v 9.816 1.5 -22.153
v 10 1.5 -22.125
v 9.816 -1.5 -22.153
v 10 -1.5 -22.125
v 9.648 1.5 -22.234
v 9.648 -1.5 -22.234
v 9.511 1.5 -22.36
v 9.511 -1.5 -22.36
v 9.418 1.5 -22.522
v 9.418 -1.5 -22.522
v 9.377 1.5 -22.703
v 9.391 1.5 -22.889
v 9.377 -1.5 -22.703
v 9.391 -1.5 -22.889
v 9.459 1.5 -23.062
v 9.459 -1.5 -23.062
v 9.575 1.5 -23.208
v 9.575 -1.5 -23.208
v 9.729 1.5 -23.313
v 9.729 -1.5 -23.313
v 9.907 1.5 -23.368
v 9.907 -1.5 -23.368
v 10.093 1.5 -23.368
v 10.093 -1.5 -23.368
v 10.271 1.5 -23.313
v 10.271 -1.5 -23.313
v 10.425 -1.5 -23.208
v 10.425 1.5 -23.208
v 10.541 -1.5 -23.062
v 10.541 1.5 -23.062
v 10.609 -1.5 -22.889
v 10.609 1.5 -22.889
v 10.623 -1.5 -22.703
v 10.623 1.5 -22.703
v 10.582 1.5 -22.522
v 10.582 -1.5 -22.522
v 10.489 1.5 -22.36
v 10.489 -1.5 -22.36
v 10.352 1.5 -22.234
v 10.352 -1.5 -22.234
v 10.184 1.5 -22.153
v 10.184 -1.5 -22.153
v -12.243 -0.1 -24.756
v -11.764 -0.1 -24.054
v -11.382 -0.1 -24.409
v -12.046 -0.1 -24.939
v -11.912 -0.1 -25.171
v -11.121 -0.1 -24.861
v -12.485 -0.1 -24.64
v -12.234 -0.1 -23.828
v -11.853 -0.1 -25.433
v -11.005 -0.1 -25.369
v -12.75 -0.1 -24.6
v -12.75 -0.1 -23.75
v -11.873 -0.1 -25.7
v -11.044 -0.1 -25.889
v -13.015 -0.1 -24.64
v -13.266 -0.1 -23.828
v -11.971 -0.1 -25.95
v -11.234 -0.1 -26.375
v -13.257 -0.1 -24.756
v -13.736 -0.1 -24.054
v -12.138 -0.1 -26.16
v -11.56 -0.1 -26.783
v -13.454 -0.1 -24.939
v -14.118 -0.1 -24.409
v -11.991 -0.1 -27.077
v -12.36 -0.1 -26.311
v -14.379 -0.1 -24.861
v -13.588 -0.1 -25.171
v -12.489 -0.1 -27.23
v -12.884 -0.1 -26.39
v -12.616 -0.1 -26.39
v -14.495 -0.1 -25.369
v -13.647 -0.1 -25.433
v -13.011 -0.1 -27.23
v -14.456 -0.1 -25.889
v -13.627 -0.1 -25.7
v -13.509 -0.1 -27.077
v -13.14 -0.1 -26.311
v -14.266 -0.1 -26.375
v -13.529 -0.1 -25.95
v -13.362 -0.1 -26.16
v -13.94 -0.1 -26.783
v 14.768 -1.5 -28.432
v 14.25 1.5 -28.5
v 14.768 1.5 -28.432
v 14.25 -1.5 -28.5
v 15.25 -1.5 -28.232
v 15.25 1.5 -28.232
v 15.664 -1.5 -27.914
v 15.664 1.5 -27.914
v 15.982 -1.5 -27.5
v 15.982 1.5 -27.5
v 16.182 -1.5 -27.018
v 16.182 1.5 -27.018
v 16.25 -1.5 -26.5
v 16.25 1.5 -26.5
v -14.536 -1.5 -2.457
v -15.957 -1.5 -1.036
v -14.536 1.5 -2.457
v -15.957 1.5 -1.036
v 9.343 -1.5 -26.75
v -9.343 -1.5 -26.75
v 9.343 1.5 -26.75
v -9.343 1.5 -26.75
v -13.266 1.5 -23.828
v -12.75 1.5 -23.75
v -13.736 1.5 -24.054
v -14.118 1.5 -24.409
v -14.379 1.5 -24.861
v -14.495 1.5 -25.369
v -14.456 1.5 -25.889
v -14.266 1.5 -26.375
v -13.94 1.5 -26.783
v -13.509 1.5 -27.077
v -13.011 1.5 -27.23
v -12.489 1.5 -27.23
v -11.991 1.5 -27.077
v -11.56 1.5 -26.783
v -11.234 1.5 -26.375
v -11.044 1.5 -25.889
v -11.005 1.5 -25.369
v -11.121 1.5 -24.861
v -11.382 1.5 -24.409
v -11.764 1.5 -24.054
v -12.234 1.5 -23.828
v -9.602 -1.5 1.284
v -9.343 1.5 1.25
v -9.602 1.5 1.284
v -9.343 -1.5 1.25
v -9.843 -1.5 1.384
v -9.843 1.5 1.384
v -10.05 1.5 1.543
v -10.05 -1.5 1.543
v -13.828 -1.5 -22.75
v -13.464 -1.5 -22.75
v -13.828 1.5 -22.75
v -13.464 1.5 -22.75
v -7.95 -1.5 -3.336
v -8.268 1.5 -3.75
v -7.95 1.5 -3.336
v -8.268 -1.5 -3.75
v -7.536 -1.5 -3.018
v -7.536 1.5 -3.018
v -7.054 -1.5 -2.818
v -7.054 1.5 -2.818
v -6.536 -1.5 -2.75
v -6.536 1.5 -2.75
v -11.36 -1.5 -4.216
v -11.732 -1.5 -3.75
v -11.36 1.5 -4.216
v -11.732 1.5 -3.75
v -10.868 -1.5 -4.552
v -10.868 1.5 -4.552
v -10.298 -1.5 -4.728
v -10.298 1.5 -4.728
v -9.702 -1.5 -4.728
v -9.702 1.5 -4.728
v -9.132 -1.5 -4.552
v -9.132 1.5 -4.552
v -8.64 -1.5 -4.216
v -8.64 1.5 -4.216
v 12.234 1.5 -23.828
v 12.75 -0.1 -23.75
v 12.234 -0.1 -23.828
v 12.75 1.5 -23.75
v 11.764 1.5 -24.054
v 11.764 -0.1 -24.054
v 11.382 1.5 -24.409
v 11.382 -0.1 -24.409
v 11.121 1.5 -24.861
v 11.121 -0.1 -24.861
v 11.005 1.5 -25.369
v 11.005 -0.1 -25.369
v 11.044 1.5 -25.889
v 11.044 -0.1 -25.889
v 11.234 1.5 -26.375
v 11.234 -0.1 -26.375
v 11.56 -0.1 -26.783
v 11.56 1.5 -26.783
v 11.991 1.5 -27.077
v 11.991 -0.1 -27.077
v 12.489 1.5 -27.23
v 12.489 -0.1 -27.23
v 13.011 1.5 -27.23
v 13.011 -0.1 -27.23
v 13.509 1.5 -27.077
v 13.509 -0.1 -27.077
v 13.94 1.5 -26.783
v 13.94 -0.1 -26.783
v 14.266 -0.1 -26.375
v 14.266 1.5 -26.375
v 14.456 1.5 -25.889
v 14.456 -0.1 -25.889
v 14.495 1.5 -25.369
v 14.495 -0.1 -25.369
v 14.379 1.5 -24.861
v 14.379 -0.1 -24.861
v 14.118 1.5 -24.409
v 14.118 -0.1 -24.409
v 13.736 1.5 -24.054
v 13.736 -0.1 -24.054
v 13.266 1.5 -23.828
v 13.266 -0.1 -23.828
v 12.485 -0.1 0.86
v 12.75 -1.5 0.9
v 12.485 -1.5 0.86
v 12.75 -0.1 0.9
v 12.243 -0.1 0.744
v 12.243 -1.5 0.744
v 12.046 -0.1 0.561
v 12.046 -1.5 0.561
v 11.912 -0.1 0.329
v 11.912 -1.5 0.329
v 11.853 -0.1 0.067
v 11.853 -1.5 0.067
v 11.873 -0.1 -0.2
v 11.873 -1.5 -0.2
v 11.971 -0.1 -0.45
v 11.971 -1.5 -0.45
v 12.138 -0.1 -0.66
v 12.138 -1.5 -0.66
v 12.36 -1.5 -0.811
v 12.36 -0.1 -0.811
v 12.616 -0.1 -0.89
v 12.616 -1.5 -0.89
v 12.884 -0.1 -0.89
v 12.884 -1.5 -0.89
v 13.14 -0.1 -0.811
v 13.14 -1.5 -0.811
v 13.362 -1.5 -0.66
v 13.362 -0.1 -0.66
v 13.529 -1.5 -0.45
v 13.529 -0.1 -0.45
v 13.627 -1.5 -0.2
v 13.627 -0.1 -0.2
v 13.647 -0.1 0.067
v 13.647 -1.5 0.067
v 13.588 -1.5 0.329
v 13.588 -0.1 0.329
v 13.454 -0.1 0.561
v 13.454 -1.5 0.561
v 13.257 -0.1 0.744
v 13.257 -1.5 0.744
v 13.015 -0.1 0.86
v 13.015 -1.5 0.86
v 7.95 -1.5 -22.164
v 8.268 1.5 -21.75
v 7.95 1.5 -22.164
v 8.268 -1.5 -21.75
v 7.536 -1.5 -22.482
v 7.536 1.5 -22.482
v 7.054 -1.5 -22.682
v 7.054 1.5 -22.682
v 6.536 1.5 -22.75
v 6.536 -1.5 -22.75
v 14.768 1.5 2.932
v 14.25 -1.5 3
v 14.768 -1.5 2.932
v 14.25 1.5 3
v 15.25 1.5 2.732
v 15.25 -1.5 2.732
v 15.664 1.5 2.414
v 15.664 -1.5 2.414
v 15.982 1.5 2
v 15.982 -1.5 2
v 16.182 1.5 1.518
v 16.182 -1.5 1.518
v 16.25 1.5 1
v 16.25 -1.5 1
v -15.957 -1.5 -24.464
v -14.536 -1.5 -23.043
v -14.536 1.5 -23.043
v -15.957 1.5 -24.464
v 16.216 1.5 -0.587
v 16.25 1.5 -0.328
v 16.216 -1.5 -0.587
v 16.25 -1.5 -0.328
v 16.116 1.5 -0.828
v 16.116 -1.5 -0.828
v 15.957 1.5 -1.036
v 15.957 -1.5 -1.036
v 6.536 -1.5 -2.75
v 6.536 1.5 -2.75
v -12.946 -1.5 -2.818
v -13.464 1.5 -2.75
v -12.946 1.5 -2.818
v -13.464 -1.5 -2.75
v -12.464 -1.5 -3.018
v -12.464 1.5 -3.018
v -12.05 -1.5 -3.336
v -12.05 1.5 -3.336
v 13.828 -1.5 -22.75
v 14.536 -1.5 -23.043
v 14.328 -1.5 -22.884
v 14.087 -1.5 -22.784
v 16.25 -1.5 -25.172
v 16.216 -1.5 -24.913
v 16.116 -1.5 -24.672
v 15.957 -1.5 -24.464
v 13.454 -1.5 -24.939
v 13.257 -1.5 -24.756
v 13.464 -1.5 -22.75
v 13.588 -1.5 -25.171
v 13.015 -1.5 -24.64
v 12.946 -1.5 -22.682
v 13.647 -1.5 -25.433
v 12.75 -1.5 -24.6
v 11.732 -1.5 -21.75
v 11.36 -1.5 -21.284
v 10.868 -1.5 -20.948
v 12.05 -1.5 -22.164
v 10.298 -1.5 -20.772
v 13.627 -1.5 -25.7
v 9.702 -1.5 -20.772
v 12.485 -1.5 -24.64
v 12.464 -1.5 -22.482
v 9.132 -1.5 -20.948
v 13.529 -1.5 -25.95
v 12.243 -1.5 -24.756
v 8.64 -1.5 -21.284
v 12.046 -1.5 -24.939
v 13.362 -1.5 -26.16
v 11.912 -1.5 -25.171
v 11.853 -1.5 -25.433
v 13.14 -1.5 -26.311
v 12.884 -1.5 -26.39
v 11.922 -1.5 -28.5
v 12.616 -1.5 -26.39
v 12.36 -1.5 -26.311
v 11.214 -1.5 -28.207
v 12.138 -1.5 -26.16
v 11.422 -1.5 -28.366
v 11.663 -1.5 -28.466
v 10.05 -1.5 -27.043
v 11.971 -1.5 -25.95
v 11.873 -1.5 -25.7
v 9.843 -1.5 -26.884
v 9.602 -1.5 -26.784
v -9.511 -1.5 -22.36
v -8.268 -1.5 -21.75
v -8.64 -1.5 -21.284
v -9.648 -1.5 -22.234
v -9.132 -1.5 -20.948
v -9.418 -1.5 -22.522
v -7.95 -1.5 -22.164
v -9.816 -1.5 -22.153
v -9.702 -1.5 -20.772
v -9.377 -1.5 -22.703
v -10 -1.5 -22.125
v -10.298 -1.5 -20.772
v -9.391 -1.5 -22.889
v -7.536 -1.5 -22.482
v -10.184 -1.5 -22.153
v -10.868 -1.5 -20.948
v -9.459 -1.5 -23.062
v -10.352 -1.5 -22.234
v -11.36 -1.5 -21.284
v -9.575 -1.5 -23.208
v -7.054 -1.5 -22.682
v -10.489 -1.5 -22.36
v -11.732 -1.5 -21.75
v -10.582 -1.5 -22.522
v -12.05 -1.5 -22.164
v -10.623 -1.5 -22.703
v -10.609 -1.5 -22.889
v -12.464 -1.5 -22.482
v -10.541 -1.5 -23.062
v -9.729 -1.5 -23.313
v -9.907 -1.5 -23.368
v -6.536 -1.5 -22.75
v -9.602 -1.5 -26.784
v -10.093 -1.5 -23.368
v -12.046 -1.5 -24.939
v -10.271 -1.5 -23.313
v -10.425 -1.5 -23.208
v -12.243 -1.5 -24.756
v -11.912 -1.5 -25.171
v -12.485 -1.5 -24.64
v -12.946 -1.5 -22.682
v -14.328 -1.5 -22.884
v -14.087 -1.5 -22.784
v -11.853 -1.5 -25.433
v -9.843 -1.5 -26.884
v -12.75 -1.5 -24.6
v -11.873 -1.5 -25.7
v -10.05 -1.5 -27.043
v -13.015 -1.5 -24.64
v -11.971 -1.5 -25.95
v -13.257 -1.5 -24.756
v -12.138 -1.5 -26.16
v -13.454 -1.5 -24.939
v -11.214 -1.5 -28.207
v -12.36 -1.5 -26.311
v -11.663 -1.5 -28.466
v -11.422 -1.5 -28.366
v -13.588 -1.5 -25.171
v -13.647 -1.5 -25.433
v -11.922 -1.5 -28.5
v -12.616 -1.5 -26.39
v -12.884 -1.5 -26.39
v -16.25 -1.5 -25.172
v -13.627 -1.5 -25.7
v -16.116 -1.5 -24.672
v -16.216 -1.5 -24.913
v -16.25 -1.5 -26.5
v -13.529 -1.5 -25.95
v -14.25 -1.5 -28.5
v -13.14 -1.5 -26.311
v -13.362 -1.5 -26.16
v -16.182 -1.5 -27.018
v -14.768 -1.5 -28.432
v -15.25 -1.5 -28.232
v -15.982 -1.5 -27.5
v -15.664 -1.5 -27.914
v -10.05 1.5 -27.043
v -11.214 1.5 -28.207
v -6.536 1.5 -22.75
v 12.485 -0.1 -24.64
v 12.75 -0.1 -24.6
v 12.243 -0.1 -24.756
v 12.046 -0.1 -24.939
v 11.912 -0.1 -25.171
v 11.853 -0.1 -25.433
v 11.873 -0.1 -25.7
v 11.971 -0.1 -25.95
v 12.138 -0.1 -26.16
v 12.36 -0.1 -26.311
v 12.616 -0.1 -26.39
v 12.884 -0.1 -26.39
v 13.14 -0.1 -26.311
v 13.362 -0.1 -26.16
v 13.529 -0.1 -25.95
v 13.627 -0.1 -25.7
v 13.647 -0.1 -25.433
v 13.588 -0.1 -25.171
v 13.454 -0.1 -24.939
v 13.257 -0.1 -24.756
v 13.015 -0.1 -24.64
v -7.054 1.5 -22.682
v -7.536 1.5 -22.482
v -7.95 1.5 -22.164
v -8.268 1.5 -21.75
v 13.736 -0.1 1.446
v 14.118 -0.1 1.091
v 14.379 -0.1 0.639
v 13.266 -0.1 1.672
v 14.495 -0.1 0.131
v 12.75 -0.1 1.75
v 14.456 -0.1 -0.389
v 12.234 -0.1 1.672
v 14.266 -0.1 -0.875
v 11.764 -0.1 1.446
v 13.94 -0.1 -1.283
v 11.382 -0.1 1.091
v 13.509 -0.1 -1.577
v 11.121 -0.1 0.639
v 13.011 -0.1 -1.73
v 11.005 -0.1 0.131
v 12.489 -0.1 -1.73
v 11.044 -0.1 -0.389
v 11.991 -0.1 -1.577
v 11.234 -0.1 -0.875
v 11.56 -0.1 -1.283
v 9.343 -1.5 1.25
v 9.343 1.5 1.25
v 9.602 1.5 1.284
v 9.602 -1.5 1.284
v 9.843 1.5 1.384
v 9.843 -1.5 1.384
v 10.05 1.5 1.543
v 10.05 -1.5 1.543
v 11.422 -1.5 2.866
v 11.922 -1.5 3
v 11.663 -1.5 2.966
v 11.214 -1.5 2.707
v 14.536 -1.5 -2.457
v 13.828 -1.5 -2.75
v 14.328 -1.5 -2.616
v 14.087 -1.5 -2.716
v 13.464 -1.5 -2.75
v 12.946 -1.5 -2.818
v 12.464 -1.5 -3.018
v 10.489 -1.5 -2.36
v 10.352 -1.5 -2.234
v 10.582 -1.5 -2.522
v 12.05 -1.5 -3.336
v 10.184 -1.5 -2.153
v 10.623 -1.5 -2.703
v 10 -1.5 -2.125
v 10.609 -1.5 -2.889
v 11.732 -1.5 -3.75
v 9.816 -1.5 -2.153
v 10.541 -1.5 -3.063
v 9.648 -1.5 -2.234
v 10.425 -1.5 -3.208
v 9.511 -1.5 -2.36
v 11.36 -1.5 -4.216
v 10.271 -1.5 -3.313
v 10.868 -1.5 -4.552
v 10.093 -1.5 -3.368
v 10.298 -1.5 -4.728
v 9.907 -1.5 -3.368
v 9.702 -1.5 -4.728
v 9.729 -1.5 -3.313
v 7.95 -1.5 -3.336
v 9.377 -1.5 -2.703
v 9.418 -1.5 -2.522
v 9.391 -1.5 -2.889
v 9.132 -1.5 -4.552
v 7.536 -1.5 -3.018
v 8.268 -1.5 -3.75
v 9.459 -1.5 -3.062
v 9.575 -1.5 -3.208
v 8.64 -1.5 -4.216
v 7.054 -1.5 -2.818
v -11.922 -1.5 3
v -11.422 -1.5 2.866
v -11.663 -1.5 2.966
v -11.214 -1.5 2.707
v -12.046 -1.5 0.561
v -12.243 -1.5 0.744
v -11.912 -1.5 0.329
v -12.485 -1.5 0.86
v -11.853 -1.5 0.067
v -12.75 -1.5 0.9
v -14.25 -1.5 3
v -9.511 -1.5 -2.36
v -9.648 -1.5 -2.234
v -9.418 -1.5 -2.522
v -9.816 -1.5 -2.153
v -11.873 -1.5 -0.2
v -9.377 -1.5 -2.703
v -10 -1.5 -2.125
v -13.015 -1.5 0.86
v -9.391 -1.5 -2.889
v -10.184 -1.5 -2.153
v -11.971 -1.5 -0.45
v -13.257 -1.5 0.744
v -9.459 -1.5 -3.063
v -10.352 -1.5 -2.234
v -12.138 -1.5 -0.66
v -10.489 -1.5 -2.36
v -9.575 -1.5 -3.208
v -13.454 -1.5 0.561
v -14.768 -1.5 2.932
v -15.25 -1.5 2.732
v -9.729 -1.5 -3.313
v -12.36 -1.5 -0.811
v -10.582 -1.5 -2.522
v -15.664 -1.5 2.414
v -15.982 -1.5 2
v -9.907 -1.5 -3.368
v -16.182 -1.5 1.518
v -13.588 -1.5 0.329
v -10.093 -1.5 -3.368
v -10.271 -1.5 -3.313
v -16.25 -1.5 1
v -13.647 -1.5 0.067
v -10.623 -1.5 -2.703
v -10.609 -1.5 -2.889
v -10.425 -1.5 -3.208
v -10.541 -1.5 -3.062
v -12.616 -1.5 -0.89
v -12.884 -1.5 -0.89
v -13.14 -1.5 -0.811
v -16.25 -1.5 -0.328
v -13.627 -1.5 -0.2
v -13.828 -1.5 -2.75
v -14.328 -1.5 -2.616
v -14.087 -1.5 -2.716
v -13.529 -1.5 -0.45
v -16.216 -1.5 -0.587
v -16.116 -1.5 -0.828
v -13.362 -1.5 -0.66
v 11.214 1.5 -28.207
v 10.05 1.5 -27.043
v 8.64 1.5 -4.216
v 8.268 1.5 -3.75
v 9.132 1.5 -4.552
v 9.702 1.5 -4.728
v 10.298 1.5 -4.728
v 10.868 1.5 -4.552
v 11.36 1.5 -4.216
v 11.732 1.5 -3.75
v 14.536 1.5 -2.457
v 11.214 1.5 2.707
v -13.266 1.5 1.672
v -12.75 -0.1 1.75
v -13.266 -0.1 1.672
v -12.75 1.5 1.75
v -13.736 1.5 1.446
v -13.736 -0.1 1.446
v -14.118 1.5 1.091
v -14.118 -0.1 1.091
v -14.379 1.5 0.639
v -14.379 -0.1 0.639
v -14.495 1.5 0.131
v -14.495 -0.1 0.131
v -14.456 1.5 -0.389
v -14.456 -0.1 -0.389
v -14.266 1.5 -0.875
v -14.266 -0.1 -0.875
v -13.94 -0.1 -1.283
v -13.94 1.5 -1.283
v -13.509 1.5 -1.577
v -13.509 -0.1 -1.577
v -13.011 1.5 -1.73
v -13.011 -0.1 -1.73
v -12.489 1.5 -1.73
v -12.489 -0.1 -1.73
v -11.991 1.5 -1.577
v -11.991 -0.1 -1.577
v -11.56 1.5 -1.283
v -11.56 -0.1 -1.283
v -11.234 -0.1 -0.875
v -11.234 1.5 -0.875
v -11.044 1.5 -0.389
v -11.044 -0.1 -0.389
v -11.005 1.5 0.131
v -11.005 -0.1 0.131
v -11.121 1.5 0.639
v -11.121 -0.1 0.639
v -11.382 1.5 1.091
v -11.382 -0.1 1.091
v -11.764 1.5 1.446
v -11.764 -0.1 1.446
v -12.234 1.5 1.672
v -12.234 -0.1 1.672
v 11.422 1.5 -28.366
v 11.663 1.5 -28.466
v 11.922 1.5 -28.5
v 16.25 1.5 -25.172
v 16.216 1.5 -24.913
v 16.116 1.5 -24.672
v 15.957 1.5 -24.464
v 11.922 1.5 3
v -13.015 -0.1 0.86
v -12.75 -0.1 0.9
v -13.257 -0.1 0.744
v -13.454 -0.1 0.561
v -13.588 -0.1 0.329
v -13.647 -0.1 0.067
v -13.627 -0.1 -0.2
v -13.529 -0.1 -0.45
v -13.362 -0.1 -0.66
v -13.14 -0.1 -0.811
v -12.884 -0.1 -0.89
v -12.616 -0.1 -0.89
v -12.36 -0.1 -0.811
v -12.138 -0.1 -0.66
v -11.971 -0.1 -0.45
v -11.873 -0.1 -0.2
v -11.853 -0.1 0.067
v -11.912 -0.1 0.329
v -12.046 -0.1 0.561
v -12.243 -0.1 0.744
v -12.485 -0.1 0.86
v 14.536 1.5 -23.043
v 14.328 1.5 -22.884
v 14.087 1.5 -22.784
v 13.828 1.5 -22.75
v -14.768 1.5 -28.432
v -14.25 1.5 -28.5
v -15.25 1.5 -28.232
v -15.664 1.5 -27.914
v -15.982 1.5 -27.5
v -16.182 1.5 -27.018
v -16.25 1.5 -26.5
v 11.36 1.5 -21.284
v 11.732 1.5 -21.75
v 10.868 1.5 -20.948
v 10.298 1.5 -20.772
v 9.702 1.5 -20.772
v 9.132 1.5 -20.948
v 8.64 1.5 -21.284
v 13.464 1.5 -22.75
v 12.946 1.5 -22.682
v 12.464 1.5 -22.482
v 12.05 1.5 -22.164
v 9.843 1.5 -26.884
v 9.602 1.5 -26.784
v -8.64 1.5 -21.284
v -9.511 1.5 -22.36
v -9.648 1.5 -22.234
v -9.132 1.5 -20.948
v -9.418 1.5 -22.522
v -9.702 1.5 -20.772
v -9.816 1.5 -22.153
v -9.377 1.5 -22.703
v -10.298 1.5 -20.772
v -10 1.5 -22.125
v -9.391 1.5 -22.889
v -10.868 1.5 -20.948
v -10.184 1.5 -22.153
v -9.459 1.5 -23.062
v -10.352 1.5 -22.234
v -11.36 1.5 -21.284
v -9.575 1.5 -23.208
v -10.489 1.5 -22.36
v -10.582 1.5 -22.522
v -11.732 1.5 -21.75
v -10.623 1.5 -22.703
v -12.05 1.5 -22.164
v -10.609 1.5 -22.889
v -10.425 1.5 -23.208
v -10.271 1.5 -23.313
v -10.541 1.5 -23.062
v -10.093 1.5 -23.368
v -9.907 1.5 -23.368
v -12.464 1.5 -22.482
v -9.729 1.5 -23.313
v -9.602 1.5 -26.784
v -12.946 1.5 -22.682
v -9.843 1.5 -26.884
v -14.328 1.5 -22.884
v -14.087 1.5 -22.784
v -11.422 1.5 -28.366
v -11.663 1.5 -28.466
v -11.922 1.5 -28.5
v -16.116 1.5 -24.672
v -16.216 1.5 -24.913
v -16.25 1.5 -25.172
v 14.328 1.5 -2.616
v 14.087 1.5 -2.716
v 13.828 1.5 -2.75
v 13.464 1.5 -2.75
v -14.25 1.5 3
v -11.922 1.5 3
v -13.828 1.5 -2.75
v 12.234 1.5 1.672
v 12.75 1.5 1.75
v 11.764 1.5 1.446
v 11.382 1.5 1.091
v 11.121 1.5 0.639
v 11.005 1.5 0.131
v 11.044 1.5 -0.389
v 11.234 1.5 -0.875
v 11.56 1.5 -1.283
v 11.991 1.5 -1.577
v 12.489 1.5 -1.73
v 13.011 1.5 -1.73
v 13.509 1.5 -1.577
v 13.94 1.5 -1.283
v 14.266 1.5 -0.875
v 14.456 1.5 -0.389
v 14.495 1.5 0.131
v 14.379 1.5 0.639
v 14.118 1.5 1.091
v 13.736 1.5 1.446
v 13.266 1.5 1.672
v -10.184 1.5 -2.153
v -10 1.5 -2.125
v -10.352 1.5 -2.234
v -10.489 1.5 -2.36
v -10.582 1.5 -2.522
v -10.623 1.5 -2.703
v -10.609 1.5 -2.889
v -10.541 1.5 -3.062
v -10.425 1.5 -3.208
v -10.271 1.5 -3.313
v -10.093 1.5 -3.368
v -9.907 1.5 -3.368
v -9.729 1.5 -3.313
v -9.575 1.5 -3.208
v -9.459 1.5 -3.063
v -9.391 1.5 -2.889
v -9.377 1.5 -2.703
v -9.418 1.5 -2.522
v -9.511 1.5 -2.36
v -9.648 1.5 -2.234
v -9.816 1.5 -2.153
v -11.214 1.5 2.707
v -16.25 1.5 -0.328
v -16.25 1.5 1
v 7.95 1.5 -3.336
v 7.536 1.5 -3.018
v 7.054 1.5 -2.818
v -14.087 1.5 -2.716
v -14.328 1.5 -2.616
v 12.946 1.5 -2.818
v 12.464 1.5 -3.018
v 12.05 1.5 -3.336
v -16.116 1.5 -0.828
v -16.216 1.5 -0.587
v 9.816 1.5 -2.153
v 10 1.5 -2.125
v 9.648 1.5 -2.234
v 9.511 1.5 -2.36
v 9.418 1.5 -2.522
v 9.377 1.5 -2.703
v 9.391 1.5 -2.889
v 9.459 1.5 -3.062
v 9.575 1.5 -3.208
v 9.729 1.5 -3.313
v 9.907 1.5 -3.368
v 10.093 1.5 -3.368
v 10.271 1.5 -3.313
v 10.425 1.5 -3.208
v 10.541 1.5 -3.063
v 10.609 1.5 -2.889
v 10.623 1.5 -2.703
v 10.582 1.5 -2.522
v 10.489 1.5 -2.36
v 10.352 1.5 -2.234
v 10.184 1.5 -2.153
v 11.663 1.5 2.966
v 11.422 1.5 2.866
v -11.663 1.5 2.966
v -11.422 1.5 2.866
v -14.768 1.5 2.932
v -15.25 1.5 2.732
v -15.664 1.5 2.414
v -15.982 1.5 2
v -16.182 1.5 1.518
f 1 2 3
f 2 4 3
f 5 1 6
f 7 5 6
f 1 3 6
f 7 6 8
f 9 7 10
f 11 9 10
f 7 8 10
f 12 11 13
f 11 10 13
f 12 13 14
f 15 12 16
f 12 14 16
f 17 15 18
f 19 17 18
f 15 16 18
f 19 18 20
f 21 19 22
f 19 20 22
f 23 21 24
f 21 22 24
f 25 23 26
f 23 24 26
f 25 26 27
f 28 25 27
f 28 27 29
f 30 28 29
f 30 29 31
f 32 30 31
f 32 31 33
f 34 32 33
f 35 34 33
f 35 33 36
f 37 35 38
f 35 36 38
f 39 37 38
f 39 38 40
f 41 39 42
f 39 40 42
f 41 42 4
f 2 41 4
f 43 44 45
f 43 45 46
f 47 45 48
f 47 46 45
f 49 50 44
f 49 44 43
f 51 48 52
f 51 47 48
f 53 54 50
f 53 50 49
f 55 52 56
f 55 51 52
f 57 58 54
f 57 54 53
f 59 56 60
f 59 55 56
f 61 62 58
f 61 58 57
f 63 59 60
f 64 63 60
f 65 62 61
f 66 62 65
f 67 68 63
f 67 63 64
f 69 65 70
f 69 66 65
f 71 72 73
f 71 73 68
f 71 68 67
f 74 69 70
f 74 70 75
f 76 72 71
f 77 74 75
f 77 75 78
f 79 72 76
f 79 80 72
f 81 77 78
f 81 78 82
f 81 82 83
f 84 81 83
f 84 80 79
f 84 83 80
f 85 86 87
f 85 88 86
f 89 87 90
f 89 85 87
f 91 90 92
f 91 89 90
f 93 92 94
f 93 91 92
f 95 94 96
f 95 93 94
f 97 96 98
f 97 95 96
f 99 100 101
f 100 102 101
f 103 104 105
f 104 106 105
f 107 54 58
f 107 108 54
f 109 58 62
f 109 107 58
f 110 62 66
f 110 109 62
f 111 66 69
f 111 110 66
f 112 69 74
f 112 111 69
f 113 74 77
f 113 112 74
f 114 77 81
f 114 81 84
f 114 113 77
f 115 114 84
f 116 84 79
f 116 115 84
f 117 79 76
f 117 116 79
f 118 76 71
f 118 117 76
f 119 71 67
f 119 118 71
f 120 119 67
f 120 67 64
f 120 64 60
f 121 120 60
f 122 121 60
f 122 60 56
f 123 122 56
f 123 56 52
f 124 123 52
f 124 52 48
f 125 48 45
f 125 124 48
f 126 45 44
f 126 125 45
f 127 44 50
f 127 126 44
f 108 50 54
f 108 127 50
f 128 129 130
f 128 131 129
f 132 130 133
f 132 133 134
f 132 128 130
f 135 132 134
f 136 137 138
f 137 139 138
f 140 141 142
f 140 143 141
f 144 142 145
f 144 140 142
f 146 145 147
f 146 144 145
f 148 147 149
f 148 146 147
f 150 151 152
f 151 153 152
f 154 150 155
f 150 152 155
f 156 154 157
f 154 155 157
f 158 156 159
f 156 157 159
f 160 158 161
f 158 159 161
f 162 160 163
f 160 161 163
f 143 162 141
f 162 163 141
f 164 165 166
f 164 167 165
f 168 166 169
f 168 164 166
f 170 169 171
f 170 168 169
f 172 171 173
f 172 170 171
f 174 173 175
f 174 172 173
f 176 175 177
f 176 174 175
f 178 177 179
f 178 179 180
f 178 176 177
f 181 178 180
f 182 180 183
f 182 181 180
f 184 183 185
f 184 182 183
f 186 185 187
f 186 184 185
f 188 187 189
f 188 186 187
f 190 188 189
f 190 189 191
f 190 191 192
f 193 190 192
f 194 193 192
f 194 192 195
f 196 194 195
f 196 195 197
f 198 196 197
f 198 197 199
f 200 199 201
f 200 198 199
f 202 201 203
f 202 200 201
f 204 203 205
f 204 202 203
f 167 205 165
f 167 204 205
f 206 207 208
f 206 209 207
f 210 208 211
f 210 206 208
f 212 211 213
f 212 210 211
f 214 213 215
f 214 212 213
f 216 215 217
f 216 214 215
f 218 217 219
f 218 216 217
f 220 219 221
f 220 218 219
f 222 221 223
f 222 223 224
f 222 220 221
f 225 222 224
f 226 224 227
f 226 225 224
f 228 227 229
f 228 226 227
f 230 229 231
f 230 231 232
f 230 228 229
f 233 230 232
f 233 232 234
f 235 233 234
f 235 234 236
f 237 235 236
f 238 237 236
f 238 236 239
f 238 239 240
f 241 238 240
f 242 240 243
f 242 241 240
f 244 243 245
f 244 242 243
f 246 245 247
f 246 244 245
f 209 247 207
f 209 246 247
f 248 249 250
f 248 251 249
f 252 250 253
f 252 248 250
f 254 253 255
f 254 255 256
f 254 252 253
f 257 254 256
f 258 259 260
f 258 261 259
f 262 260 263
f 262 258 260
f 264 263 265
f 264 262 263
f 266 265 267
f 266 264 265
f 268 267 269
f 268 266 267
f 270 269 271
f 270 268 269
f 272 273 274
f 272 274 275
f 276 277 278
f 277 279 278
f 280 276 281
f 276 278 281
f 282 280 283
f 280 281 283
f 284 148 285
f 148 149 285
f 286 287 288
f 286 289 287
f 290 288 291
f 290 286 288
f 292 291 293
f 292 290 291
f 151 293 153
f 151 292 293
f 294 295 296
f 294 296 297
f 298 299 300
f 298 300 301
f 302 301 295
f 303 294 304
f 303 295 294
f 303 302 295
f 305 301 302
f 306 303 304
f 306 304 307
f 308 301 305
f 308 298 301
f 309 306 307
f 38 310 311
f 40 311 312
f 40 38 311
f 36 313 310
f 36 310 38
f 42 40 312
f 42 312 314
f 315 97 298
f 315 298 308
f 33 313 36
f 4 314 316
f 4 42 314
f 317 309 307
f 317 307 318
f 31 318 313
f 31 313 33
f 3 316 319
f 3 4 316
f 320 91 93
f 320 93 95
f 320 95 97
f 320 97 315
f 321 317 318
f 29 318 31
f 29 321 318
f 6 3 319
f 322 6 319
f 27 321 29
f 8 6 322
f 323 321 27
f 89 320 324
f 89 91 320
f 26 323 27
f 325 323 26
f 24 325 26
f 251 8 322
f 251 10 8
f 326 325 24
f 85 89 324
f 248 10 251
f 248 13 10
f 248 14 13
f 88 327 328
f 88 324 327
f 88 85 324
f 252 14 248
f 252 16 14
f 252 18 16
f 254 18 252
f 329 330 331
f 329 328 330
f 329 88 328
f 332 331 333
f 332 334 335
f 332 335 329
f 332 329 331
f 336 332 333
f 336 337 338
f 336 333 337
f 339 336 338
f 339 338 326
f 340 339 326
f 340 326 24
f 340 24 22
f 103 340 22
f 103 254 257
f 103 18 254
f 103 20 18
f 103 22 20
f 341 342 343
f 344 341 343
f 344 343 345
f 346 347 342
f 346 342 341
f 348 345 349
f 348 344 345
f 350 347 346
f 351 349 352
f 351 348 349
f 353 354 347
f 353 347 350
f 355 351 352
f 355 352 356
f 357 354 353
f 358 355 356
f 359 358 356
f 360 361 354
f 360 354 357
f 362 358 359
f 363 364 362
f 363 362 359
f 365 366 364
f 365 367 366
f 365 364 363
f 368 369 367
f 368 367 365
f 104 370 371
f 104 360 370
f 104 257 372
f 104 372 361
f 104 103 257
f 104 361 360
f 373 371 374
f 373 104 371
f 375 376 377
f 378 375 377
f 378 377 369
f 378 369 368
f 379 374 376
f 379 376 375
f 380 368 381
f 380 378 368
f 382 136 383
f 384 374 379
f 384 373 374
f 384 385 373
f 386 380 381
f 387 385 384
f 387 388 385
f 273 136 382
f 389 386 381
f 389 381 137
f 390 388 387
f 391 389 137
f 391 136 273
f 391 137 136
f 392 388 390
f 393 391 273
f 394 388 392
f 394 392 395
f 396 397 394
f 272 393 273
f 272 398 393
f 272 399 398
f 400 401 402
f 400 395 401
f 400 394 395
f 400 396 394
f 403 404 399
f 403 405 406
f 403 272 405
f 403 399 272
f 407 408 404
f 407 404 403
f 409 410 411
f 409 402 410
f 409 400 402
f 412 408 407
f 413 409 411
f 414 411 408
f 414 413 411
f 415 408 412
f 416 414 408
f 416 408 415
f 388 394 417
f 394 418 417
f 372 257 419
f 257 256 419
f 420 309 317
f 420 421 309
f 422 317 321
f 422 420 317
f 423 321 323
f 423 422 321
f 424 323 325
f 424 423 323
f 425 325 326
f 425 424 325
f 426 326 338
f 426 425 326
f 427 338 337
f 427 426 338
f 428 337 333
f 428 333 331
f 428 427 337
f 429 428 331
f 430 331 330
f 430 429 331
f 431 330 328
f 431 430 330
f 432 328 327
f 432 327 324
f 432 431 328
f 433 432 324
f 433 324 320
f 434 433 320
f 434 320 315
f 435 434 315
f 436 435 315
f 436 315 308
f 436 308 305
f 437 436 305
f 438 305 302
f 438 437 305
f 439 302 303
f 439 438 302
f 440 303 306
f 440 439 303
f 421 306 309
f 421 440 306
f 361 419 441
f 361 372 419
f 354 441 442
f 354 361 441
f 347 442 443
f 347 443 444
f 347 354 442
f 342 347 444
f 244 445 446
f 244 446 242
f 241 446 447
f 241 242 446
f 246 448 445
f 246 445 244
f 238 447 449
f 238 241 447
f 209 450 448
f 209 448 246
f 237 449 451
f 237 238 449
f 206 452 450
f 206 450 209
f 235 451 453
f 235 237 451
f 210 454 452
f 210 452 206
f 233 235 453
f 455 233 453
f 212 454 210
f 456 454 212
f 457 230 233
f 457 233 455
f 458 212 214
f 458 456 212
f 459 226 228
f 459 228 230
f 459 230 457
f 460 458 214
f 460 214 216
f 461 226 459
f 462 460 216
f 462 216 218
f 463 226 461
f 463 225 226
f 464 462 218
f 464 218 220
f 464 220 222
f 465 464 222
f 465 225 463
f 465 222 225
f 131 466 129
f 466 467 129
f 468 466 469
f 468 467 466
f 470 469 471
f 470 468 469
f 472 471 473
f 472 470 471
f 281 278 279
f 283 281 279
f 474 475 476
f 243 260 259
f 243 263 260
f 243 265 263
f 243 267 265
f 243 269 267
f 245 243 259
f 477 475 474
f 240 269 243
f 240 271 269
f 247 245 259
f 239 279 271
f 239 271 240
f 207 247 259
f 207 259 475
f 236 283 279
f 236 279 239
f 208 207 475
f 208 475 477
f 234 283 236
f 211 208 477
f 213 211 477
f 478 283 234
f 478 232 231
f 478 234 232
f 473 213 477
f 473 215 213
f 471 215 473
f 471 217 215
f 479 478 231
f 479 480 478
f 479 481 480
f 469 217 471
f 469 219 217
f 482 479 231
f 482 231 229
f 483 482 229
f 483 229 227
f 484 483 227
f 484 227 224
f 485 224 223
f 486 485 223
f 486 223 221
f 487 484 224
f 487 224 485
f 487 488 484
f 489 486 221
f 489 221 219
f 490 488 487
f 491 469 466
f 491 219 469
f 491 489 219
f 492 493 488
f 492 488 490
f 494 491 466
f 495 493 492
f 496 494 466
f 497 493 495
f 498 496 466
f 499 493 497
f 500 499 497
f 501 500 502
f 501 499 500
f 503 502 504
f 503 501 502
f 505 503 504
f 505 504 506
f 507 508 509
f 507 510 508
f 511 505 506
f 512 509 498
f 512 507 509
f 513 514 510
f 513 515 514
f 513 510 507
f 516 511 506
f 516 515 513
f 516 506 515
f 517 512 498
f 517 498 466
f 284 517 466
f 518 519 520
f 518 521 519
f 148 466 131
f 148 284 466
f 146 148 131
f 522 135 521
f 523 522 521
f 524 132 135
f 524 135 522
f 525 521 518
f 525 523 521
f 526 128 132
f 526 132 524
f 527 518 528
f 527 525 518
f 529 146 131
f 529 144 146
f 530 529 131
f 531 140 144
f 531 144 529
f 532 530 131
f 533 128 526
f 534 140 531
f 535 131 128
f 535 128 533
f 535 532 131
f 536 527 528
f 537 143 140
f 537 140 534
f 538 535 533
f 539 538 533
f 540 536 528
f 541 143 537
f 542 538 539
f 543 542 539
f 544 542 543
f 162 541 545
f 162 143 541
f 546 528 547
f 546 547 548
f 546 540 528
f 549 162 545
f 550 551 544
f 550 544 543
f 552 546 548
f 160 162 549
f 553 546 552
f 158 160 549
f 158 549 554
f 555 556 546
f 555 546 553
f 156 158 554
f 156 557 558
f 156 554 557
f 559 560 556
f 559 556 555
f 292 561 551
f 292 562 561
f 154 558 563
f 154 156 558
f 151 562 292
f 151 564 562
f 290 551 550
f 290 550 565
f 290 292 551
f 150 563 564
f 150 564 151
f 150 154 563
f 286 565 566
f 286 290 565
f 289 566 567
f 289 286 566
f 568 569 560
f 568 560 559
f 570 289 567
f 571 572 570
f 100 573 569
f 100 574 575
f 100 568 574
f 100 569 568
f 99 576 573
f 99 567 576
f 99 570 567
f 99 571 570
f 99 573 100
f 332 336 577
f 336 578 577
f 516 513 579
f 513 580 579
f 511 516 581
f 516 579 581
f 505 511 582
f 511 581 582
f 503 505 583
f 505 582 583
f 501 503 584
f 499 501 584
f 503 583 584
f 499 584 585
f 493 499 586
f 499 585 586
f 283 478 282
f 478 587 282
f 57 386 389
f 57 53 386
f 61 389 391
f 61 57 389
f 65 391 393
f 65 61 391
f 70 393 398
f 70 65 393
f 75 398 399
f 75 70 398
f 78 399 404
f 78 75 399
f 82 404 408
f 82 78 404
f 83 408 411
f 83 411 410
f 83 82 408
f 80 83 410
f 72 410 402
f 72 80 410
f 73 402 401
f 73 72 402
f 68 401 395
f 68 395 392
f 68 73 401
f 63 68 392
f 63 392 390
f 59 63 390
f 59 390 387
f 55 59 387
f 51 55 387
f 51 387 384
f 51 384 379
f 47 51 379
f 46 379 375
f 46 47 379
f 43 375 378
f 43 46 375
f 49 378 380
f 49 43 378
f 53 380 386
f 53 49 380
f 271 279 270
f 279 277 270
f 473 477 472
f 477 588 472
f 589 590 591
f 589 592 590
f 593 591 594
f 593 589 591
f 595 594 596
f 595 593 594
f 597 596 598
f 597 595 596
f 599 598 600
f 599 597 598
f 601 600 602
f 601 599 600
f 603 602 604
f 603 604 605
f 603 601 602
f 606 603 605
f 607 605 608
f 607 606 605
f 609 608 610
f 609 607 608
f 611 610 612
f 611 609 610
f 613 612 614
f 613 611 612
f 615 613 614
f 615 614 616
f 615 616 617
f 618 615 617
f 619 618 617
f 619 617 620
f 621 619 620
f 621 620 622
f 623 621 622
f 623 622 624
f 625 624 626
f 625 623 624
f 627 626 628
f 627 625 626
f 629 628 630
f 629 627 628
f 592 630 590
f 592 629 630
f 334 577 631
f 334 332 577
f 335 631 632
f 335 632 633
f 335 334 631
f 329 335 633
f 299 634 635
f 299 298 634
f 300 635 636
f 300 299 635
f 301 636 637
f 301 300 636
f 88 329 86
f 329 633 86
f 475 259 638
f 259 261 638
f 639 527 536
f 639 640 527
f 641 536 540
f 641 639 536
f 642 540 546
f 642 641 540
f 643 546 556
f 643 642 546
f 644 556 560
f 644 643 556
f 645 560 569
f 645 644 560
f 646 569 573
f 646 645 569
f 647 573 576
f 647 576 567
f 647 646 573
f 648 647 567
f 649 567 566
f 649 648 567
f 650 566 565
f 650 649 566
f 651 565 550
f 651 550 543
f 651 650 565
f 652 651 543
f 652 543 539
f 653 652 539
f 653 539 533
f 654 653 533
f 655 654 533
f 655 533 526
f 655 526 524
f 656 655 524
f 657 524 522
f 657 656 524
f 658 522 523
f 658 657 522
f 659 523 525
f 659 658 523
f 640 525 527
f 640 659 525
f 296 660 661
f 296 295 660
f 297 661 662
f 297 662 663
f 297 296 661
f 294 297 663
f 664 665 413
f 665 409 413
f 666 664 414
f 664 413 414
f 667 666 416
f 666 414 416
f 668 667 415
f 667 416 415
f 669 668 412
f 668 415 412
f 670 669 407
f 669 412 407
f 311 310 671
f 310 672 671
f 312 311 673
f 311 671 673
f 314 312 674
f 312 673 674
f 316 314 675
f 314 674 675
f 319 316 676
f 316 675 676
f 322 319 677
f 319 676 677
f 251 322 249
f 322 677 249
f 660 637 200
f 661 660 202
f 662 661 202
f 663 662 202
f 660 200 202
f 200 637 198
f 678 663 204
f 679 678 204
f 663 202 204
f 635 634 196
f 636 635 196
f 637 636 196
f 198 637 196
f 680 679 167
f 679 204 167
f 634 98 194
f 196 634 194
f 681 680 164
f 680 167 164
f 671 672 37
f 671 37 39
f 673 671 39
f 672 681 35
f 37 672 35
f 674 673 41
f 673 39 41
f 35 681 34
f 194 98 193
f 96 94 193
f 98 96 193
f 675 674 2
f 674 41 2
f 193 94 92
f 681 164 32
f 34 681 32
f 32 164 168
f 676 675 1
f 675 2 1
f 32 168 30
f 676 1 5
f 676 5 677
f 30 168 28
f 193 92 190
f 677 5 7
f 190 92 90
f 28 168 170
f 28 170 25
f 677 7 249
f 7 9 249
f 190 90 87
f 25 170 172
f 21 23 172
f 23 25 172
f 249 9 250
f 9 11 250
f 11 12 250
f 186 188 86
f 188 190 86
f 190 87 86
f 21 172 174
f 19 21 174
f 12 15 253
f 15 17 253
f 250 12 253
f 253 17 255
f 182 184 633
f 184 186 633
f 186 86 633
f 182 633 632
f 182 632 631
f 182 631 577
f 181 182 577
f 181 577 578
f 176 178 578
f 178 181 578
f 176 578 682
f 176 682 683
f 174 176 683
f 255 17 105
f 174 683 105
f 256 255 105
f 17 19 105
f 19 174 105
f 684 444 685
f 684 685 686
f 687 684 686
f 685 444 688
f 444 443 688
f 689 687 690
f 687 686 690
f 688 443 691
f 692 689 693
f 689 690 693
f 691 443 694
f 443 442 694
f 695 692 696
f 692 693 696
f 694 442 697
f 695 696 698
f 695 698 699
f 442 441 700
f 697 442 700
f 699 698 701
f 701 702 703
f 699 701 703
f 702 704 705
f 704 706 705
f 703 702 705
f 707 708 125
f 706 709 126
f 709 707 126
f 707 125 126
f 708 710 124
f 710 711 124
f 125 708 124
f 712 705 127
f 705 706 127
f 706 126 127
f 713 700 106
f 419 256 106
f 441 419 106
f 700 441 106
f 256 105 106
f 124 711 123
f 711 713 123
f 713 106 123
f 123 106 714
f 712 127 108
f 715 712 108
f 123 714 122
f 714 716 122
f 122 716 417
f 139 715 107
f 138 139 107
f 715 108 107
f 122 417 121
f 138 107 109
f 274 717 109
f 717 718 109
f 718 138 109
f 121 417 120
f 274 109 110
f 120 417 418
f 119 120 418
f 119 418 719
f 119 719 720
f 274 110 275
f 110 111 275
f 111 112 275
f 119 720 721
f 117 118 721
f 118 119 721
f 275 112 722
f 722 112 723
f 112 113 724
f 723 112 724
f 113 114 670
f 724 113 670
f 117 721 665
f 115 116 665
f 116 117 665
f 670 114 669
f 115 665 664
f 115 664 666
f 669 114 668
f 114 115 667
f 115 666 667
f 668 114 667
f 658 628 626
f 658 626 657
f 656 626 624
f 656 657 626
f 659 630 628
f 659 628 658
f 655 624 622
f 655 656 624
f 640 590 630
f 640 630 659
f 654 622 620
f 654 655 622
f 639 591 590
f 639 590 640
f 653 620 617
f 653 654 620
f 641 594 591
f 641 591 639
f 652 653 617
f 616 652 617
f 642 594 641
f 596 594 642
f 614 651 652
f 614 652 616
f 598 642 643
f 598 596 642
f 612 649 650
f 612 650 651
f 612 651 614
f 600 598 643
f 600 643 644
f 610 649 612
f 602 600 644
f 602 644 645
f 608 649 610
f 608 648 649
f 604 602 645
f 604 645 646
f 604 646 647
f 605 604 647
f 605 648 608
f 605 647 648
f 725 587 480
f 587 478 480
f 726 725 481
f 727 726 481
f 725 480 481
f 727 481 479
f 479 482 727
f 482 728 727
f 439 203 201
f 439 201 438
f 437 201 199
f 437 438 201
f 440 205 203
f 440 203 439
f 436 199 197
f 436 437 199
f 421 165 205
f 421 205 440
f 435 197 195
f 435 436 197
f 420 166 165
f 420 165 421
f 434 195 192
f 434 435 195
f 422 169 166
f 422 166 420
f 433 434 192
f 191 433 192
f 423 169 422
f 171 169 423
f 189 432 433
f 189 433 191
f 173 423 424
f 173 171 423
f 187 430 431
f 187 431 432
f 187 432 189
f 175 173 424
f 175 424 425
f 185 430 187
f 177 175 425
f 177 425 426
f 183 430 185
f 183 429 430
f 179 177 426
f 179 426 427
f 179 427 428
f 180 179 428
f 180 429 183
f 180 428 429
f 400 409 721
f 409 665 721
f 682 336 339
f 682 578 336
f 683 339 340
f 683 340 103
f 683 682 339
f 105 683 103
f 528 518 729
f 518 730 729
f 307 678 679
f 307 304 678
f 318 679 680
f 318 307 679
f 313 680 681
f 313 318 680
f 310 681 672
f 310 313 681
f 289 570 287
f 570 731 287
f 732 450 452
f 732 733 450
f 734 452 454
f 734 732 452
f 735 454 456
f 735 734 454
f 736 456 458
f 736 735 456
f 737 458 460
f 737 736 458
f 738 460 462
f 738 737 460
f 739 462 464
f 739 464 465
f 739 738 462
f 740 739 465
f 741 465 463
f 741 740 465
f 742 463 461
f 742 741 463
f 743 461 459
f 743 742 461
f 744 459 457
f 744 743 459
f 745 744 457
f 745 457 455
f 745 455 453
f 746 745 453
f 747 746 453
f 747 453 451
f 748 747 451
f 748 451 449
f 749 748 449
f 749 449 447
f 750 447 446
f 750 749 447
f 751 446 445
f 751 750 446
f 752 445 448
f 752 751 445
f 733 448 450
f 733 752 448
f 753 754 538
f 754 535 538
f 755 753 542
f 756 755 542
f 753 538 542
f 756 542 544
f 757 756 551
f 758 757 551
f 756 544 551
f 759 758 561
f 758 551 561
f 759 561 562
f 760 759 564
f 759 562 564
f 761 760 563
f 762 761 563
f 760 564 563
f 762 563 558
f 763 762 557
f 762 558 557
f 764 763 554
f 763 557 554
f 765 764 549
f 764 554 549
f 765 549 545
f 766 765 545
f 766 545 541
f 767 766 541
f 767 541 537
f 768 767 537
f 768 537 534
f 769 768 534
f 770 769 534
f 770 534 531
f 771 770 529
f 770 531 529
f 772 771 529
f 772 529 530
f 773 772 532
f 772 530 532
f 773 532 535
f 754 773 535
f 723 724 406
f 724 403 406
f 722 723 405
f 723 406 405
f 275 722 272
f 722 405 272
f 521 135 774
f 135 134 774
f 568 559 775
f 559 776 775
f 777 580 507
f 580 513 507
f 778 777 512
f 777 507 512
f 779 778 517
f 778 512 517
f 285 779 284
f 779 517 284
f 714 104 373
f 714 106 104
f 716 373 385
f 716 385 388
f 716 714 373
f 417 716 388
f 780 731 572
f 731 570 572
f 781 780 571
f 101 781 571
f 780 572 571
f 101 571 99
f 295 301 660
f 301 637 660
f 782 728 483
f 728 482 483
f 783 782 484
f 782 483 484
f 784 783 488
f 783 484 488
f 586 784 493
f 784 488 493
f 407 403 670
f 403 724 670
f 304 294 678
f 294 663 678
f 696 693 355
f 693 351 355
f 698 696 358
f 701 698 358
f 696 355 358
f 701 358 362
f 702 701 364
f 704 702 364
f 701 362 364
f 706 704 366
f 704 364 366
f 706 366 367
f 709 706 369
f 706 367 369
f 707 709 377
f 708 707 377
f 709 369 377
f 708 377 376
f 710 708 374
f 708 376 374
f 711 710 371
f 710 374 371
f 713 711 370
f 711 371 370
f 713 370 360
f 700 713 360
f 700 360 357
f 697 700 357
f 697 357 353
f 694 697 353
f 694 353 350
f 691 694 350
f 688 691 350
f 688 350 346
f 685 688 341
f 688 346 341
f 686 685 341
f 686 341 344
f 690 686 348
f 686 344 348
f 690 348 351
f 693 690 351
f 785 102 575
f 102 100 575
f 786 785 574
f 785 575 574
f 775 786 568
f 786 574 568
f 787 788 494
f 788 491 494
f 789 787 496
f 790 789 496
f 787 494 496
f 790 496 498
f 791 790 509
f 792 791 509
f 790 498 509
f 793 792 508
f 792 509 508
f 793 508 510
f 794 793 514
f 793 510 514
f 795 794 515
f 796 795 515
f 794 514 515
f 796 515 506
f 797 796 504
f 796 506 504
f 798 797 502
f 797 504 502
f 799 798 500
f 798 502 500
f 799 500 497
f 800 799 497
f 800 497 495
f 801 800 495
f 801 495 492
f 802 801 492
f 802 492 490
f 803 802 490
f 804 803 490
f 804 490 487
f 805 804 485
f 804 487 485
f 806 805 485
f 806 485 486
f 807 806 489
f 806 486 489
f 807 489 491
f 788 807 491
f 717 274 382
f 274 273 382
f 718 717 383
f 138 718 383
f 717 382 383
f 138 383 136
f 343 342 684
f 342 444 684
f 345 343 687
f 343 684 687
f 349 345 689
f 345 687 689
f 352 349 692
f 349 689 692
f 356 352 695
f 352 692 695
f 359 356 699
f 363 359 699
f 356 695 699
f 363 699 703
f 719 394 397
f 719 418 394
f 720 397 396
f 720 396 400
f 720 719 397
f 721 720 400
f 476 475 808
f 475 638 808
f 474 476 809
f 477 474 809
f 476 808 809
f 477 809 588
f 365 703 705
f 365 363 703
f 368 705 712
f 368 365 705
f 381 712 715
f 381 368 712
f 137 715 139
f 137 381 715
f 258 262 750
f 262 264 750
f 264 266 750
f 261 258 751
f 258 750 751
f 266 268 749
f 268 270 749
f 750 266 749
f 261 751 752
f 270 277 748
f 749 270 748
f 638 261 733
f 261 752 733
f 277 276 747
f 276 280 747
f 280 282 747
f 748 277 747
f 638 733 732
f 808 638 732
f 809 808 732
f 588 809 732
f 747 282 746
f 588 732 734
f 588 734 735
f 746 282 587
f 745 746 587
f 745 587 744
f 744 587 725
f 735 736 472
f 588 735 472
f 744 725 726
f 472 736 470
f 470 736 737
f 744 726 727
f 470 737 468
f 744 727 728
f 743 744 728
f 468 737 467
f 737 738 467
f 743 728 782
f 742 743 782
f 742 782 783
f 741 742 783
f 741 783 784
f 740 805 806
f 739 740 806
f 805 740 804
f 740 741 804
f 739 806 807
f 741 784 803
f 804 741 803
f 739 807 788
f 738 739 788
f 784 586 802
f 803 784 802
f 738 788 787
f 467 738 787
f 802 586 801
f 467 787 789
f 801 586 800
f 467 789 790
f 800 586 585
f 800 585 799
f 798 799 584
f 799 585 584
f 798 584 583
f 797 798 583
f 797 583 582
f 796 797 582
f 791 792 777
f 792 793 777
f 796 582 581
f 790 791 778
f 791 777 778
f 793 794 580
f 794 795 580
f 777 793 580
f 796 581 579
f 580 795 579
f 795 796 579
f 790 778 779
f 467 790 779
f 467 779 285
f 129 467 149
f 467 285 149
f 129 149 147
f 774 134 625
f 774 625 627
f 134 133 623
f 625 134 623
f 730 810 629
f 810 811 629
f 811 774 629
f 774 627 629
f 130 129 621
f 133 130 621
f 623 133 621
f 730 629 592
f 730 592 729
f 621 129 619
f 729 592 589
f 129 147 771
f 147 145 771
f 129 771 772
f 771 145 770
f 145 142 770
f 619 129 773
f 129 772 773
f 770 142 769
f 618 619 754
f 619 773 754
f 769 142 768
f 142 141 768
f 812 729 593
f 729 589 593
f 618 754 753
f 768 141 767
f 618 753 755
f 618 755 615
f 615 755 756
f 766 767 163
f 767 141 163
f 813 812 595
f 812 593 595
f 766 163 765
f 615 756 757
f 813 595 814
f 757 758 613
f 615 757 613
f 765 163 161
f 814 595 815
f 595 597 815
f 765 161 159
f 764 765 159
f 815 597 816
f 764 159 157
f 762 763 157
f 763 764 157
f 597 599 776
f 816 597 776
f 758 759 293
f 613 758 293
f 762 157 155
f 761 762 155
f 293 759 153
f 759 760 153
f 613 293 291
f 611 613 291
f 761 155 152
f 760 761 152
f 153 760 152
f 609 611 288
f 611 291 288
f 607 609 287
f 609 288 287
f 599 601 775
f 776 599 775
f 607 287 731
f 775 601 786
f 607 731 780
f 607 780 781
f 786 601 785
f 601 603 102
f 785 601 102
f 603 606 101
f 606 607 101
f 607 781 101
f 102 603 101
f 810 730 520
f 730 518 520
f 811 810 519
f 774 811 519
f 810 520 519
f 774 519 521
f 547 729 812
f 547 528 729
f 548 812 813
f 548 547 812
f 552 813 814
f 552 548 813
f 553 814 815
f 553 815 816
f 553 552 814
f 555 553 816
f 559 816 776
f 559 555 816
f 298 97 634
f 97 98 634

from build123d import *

# Parameters (mm, degrees)
BOSS_EXTRUDE1_DEPTH               = 1.5
BOSS_EXTRUDE1_2_DEPTH             = 1.5
FILLET1_R                         = 1
FILLET2_R                         = 2
CBORE_FOR_M1_6_SHCS1_AT_2_COUNT   = 2
CBORE_FOR_M1_6_SHCS1_AT_2_PITCH   = 25.5
CBORE_FOR_M1_6_SHCS1_AT_3_COUNT   = 2
CBORE_FOR_M1_6_SHCS1_AT_3_PITCH   = 25.5
CBORE_FOR_M1_6_SHCS1_AT_4_COUNT   = 2
CBORE_FOR_M1_6_SHCS1_AT_4_PITCH   = 36.062445841
SKETCH6_W                         = 0.625
SKETCH6_H                         = 3
M1_6X0_35_TAPPED_HOLE1_AT_2_COUNT = 2
M1_6X0_35_TAPPED_HOLE1_AT_2_PITCH = 20
M1_6X0_35_TAPPED_HOLE1_AT_3_COUNT = 2
M1_6X0_35_TAPPED_HOLE1_AT_3_PITCH = 20
M1_6X0_35_TAPPED_HOLE1_AT_4_COUNT = 2
M1_6X0_35_TAPPED_HOLE1_AT_4_PITCH = 28.284271247
FILLET3_R                         = 1
FILLET4_R                         = 2


with BuildPart() as part:
    # Sketch1 → Boss-Extrude1 (new, symmetric)
    with BuildSketch(Plane(origin=(0, 0, 0), x_dir=(1, 0, 0), z_dir=(0, 1, 0))):
        with BuildLine():
            Line((9.757359313, -1.25), (-9.757359313, -1.25))
            Line((-9.757359313, -1.25), (-11.507359313, -3))
            Line((-11.507359313, -3), (-16.25, -3))
            Line((-16.25, -3), (-16.25, 0.742640687))
            Line((-16.25, 0.742640687), (-14.242640687, 2.75))
            Line((-14.242640687, 2.75), (-12, 2.75))
            ThreePointArc((-12, 2.75), (-10, 4.75), (-8, 2.75))
            Line((-8, 2.75), (8, 2.75))
            ThreePointArc((8, 2.75), (10, 4.75), (12, 2.75))
            Line((12, 2.75), (14.242640687, 2.75))
            Line((14.242640687, 2.75), (16.25, 0.742640687))
            Line((16.25, 0.742640687), (16.25, -3))
            Line((16.25, -3), (11.507359313, -3))
            Line((11.507359313, -3), (9.757359313, -1.25))
        make_face()
    extrude(amount=BOSS_EXTRUDE1_DEPTH, both=True)

    # Fillet1
    fillet1_edges = [part.edges().sort_by_distance(p)[0] for p in [
        (-11.507359313, 0, 3),
        (-16.25, 0, -0.742640687),
        (-14.242640687, 0, -2.75),
        (14.242640687, 0, -2.75),
        (16.25, 0, -0.742640687),
        (11.507359313, 0, 3),
        (9.757359313, 0, 1.25),
        (-9.757359313, 0, 1.25),
    ]]
    fillet(fillet1_edges, radius=FILLET1_R)

    # Fillet2
    fillet2_edges = [part.edges().sort_by_distance(p)[0] for p in [
        (-16.25, 0, 3),
        (-12, 0, -2.75),
        (-8, 0, -2.75),
        (8, 0, -2.75),
        (12, 0, -2.75),
        (16.25, 0, 3),
    ]]
    fillet(fillet2_edges, radius=FILLET2_R)

    # Sketch3 → CBORE for M1.6 SHCS1 (revolve, cut)
    with BuildSketch(Plane(origin=(-12.75, 1.5, 0), x_dir=(0, 0, 1), z_dir=(1, 0, 0))):
        Polygon((0, 0), (0, 3), (0.9, 3), (0.9, 1.6), (1.75, 1.6), (1.75, 0), align=None)
    cbore_for_m1_6_shcs1 = revolve(axis=Axis((-12.75, 7.85, 0), (0, -1, 0)), mode=Mode.SUBTRACT)

    # CBORE for M1.6 SHCS1 at 2: CBORE for M1.6 SHCS1 ×2
    with Locations(*[(i * CBORE_FOR_M1_6_SHCS1_AT_2_PITCH, 0, 0) for i in range(1, CBORE_FOR_M1_6_SHCS1_AT_2_COUNT)]):
        add(cbore_for_m1_6_shcs1, mode=Mode.SUBTRACT)

    # Sketch6 → M1.6x0.35 Tapped Hole1 (revolve, cut)
    with BuildSketch(Plane(origin=(-10, 1.5, -2.75), x_dir=(0, 0, 1), z_dir=(1, 0, 0))):
        with Locations((0.3125, 1.5)):
            Rectangle(SKETCH6_W, SKETCH6_H)
    m1_6x0_35_tapped_hole1 = revolve(axis=Axis((-10, 7.85, -2.75), (0, -1, 0)), mode=Mode.SUBTRACT)

    # M1.6x0.35 Tapped Hole1 at 2: M1.6x0.35 Tapped Hole1 ×2
    with Locations(*[(i * M1_6X0_35_TAPPED_HOLE1_AT_2_PITCH, 0, 0) for i in range(1, M1_6X0_35_TAPPED_HOLE1_AT_2_COUNT)]):
        add(m1_6x0_35_tapped_hole1, mode=Mode.SUBTRACT)


with BuildPart() as body_2:
    # Sketch1 → Boss-Extrude1 2 (new, symmetric)
    with BuildSketch(Plane(origin=(0, 0, 0), x_dir=(1, 0, 0), z_dir=(0, 1, 0))):
        with BuildLine():
            Line((9.757359313, 26.75), (11.507359313, 28.5))
            Line((11.507359313, 28.5), (16.25, 28.5))
            Line((16.25, 28.5), (16.25, 24.757359313))
            Line((16.25, 24.757359313), (14.242640687, 22.75))
            Line((14.242640687, 22.75), (12, 22.75))
            ThreePointArc((12, 22.75), (10, 20.75), (8, 22.75))
            Line((8, 22.75), (-8, 22.75))
            ThreePointArc((-8, 22.75), (-10, 20.75), (-12, 22.75))
            Line((-12, 22.75), (-14.242640687, 22.75))
            Line((-14.242640687, 22.75), (-16.25, 24.757359313))
            Line((-16.25, 24.757359313), (-16.25, 28.5))
            Line((-16.25, 28.5), (-11.507359313, 28.5))
            Line((-11.507359313, 28.5), (-9.757359313, 26.75))
            Line((-9.757359313, 26.75), (9.757359313, 26.75))
        make_face()
    extrude(amount=BOSS_EXTRUDE1_2_DEPTH, both=True)

    # CBORE for M1.6 SHCS1 at 3: CBORE for M1.6 SHCS1 ×2
    with Locations(*[(0, 0, -i * CBORE_FOR_M1_6_SHCS1_AT_3_PITCH) for i in range(1, CBORE_FOR_M1_6_SHCS1_AT_3_COUNT)]):
        add(cbore_for_m1_6_shcs1, mode=Mode.SUBTRACT)

    # CBORE for M1.6 SHCS1 at 4: CBORE for M1.6 SHCS1 ×2
    with Locations(*[Vector(0.7071067811865476, 0, -0.7071067811865476) * (i * CBORE_FOR_M1_6_SHCS1_AT_4_PITCH) for i in range(1, CBORE_FOR_M1_6_SHCS1_AT_4_COUNT)]):
        add(cbore_for_m1_6_shcs1, mode=Mode.SUBTRACT)

    # M1.6x0.35 Tapped Hole1 at 3: M1.6x0.35 Tapped Hole1 ×2
    with Locations(*[(0, 0, -i * M1_6X0_35_TAPPED_HOLE1_AT_3_PITCH) for i in range(1, M1_6X0_35_TAPPED_HOLE1_AT_3_COUNT)]):
        add(m1_6x0_35_tapped_hole1, mode=Mode.SUBTRACT)

    # M1.6x0.35 Tapped Hole1 at 4: M1.6x0.35 Tapped Hole1 ×2
    with Locations(*[Vector(0.7071067811865476, 0, -0.7071067811865476) * (i * M1_6X0_35_TAPPED_HOLE1_AT_4_PITCH) for i in range(1, M1_6X0_35_TAPPED_HOLE1_AT_4_COUNT)]):
        add(m1_6x0_35_tapped_hole1, mode=Mode.SUBTRACT)

    # Fillet3
    fillet3_edges = [body_2.edges().sort_by_distance(p)[0] for p in [
        (-14.242640687, 0, -22.75),
        (-16.25, 0, -24.757359313),
        (-11.507359313, 0, -28.5),
        (-9.757359313, 0, -26.75),
        (9.757359313, 0, -26.75),
        (11.507359313, 0, -28.5),
        (16.25, 0, -24.757359313),
        (14.242640687, 0, -22.75),
    ]]
    fillet(fillet3_edges, radius=FILLET3_R)

    # Fillet4
    fillet4_edges = [body_2.edges().sort_by_distance(p)[0] for p in [
        (8, 0, -22.75),
        (-8, 0, -22.75),
        (-12, 0, -22.75),
        (-16.25, 0, -28.5),
        (16.25, 0, -28.5),
        (12, 0, -22.75),
    ]]
    fillet(fillet4_edges, radius=FILLET4_R)


solid = Compound([part.part, body_2.part])
